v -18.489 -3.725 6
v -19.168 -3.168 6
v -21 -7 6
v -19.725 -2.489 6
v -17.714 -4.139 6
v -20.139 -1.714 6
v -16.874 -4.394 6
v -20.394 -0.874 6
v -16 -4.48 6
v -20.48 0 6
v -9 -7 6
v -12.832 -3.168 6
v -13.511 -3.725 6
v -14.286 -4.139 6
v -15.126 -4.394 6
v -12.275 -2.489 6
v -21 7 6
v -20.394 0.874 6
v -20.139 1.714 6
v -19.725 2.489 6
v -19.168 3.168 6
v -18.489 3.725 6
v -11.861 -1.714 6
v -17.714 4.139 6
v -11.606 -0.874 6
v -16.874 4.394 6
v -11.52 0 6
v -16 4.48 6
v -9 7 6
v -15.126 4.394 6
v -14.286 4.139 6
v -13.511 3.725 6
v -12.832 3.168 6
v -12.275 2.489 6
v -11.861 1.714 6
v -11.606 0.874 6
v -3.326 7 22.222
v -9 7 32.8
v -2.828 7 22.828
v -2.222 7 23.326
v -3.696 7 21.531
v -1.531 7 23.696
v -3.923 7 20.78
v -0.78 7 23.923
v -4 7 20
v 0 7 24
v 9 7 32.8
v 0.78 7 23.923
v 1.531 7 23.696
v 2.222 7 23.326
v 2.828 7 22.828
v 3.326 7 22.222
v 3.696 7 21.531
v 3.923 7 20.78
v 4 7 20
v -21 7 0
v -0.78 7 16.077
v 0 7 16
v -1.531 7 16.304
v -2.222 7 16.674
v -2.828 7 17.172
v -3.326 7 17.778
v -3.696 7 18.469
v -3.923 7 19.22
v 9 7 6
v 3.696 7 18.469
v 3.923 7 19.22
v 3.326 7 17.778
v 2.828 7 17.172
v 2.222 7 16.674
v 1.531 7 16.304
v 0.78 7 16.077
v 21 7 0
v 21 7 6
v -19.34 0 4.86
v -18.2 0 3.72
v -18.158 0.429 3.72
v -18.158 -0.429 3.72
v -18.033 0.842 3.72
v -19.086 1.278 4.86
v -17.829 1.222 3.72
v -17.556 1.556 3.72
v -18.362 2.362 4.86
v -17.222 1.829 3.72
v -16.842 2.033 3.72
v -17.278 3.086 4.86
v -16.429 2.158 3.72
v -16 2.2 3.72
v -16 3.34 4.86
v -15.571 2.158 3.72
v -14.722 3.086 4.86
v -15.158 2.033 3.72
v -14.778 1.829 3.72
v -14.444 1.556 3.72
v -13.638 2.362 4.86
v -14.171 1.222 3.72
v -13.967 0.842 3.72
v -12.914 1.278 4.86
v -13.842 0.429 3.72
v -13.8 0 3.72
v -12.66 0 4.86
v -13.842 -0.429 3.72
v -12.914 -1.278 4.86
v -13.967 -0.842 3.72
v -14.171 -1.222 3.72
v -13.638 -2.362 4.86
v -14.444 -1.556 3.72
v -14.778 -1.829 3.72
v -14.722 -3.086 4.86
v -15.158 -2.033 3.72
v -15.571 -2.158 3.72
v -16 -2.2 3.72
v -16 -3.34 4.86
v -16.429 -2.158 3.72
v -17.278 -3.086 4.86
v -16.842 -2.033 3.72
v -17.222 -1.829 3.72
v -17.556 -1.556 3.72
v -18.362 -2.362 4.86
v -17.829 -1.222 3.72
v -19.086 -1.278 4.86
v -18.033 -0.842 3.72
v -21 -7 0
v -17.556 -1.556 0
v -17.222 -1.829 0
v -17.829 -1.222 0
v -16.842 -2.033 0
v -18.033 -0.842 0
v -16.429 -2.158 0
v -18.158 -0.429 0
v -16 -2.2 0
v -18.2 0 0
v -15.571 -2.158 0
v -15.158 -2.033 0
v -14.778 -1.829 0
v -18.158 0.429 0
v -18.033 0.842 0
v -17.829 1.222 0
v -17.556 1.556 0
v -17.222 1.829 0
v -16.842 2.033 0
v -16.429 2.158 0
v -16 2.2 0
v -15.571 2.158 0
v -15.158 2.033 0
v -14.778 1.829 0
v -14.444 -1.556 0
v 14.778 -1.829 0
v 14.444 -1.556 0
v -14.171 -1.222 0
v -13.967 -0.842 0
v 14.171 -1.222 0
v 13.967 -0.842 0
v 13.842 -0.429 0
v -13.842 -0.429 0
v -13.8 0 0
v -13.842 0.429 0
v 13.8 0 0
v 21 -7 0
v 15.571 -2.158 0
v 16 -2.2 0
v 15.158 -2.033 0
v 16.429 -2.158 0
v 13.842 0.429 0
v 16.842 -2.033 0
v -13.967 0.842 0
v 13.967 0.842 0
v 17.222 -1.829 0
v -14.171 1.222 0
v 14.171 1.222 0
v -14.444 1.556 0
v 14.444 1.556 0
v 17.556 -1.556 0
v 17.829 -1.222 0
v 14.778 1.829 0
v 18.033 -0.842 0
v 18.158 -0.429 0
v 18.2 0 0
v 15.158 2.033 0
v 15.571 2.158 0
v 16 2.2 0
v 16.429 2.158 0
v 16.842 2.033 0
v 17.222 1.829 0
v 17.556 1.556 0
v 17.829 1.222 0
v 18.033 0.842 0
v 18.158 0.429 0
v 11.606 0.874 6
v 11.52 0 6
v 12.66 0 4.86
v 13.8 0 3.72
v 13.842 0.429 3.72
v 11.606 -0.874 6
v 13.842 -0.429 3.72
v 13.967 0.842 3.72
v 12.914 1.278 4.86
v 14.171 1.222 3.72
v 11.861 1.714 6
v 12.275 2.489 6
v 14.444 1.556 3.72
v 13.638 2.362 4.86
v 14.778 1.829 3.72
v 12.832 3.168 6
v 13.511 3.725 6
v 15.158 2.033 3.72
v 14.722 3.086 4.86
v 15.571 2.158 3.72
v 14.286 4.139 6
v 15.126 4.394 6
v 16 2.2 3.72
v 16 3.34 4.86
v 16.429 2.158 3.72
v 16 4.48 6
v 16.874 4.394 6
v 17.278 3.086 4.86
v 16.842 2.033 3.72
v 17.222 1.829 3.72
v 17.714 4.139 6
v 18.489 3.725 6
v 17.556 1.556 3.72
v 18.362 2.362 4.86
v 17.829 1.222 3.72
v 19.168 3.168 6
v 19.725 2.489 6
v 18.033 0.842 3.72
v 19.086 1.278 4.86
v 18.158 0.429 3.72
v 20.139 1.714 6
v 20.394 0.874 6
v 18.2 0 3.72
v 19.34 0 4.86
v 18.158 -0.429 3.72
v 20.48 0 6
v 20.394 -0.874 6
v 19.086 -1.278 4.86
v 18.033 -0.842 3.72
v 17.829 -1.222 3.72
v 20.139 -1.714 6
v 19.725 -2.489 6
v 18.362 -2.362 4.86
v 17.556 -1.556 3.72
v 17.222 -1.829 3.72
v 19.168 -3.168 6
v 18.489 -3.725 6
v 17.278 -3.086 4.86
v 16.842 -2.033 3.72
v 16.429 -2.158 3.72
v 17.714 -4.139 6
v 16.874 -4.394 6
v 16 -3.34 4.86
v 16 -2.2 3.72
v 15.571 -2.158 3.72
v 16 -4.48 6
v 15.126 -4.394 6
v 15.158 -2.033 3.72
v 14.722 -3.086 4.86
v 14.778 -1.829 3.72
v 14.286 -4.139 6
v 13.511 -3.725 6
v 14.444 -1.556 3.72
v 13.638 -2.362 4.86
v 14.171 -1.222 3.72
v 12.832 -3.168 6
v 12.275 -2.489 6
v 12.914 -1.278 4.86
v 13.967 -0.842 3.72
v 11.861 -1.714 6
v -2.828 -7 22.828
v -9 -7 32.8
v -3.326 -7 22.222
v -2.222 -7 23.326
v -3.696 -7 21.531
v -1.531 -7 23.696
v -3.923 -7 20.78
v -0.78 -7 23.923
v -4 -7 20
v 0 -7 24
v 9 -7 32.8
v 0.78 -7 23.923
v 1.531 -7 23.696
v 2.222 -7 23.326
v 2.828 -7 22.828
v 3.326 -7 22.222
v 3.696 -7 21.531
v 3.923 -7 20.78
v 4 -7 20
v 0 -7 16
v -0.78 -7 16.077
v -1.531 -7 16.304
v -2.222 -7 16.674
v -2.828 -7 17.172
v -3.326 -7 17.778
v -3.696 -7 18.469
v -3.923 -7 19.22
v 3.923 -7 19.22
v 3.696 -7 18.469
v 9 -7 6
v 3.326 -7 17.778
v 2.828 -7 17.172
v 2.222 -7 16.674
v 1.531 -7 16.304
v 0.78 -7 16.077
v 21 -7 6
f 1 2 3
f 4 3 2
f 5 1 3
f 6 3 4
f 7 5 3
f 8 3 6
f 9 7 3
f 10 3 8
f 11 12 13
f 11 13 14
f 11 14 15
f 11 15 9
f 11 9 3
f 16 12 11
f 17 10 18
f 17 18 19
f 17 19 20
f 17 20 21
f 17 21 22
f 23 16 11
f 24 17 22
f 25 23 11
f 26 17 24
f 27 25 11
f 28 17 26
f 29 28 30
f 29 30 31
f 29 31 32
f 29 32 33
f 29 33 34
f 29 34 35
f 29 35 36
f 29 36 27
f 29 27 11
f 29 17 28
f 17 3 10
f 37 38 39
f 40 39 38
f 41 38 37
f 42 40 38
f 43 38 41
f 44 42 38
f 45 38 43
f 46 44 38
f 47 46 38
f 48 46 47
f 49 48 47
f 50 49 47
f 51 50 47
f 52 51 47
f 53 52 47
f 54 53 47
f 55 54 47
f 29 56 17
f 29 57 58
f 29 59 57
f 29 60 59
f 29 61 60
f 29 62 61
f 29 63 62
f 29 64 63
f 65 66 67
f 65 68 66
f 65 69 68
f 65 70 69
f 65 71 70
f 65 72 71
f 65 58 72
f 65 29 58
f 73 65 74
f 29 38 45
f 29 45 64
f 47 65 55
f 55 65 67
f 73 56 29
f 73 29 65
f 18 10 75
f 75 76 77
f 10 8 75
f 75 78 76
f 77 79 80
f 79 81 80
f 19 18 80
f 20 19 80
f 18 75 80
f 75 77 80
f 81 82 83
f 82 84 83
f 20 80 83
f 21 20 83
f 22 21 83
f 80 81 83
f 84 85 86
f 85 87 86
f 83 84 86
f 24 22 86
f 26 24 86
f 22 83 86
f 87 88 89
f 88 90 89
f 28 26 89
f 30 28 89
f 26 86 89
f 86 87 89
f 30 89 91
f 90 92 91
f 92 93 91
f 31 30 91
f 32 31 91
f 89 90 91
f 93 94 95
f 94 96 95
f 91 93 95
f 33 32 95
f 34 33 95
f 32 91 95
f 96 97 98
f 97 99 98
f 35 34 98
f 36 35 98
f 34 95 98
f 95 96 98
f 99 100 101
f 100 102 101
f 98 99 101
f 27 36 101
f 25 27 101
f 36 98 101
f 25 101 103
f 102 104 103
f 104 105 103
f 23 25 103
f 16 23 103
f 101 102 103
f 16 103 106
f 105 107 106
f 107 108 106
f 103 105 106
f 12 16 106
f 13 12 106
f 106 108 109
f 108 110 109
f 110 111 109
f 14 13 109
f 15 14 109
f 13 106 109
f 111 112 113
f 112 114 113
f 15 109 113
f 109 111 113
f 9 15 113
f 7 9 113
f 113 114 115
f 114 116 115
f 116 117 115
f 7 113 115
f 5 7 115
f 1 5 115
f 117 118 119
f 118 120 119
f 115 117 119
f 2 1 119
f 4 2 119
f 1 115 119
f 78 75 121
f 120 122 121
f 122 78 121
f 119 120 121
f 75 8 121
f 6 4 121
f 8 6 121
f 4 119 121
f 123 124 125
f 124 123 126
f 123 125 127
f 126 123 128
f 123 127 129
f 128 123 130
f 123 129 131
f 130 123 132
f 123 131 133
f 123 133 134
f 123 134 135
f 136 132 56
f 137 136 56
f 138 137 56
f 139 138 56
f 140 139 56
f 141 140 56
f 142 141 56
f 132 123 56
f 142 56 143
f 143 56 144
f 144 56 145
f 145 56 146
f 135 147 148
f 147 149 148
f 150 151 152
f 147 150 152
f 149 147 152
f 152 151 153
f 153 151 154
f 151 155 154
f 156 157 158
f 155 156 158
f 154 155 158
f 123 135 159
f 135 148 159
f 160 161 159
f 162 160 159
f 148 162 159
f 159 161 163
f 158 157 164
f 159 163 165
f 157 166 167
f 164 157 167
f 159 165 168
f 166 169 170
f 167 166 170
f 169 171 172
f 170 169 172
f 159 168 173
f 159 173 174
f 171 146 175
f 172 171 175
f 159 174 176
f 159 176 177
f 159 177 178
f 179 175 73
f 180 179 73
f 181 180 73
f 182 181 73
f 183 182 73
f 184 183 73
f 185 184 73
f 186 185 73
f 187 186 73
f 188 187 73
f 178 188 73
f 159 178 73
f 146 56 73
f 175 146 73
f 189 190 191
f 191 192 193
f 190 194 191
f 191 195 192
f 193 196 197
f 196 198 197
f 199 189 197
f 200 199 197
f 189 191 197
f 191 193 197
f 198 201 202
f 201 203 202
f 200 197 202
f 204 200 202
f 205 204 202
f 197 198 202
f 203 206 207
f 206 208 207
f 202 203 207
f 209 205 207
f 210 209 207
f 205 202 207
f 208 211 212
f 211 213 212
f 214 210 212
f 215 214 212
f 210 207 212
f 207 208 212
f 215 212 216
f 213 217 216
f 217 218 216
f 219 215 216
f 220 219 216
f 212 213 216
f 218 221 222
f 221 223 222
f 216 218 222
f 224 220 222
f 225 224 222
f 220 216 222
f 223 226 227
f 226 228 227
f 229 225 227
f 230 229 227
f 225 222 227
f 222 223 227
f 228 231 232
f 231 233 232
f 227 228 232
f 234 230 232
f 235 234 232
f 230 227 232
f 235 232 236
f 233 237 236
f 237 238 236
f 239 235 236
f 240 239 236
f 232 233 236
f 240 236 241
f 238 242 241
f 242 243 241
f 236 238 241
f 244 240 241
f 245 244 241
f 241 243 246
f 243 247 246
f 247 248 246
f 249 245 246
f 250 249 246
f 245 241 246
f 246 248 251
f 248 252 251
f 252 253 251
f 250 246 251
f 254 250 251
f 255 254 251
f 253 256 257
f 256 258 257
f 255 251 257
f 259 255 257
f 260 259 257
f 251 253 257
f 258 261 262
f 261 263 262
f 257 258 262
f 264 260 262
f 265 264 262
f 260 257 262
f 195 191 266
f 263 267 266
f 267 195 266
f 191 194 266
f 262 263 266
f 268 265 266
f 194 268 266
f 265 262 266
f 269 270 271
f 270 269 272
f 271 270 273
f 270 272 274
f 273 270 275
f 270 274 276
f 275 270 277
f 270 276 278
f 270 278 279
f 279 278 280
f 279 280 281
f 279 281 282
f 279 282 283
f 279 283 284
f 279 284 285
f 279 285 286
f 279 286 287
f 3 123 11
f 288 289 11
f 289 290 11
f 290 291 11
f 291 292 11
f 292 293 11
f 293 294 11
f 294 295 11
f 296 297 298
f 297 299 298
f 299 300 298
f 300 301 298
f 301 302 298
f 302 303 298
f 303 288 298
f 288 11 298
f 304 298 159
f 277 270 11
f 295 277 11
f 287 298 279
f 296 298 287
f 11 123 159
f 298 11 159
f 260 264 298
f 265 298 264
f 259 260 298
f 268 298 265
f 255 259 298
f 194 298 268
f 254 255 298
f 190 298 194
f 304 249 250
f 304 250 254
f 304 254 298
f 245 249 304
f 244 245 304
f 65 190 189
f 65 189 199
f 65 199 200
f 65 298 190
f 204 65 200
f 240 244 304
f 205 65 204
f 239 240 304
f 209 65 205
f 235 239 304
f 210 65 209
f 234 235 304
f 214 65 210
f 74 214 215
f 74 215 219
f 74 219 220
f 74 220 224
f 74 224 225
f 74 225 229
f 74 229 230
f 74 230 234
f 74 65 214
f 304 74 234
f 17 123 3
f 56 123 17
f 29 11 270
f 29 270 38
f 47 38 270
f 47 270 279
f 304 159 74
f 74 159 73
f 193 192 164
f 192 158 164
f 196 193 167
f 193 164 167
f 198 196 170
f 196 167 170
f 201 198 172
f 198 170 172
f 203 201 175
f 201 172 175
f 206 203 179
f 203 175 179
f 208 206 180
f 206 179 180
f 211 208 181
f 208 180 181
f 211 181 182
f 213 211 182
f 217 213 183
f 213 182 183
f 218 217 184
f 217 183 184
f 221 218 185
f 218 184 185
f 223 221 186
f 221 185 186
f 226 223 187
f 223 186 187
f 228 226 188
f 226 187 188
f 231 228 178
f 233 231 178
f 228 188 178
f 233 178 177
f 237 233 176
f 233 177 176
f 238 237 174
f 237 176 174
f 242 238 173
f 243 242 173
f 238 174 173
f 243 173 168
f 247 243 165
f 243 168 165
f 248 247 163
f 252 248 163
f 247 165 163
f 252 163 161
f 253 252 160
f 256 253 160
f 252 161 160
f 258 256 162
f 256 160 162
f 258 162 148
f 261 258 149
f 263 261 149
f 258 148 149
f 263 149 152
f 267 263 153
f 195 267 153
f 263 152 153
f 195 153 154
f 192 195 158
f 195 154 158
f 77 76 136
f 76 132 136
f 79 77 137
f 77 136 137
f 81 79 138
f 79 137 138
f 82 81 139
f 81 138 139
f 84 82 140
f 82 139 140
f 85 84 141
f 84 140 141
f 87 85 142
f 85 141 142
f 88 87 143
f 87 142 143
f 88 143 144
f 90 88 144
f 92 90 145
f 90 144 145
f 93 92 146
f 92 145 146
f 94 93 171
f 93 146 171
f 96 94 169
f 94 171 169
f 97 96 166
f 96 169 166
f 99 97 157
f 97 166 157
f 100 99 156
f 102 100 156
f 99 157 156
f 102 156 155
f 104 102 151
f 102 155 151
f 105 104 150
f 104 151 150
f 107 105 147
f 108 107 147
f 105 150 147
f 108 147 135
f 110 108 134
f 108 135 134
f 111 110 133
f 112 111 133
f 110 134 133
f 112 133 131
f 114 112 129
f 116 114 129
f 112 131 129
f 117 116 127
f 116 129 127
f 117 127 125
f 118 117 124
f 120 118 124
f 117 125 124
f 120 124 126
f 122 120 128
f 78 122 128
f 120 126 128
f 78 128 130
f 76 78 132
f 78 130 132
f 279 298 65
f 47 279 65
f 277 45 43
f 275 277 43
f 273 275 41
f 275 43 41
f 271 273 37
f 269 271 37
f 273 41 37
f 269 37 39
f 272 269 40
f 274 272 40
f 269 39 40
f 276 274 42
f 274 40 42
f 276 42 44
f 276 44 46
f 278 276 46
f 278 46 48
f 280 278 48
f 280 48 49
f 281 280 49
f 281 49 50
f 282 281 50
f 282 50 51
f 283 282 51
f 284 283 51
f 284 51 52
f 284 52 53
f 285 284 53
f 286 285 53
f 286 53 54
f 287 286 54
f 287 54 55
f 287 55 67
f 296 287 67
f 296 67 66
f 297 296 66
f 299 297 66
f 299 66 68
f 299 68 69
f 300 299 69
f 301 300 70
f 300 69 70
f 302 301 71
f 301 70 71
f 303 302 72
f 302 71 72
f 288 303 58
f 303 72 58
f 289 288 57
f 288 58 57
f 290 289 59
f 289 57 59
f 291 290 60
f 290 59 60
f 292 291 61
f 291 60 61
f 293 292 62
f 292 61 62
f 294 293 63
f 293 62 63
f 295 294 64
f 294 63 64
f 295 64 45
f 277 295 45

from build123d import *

# Parameters (mm, degrees)
F0_W           = 42
F0_H           = 14
F1_DEPTH       = 6
F2_W           = 18
F2_H           = 14
F3_DEPTH       = 26.8
F6_D           = 4.4
F6_CSINK_D     = 8.96
F6_CSINK_ANGLE = 90
F7_D           = 8


with BuildPart() as f1:
    # F0 (on Top) → F1 (new body)
    with BuildSketch(Plane.XY):
        Rectangle(F0_W, F0_H)
    extrude(amount=F1_DEPTH)

    # F2 (on face) → F3 (join)
    with BuildSketch(Plane.XY.offset(6)):
        Rectangle(F2_W, F2_H)
    extrude(amount=F3_DEPTH)

    # F6 (through all)
    with Locations(Plane.XY.offset(6)):
        with Locations((-16, 0), (16, 0)):
            CounterSinkHole(F6_D / 2, F6_CSINK_D / 2, counter_sink_angle=F6_CSINK_ANGLE)

    # F7 (through all)
    with Locations(Plane.XZ.offset(7)):
        with Locations((0, 20)):
            Hole(F7_D / 2)


solid = f1.part
